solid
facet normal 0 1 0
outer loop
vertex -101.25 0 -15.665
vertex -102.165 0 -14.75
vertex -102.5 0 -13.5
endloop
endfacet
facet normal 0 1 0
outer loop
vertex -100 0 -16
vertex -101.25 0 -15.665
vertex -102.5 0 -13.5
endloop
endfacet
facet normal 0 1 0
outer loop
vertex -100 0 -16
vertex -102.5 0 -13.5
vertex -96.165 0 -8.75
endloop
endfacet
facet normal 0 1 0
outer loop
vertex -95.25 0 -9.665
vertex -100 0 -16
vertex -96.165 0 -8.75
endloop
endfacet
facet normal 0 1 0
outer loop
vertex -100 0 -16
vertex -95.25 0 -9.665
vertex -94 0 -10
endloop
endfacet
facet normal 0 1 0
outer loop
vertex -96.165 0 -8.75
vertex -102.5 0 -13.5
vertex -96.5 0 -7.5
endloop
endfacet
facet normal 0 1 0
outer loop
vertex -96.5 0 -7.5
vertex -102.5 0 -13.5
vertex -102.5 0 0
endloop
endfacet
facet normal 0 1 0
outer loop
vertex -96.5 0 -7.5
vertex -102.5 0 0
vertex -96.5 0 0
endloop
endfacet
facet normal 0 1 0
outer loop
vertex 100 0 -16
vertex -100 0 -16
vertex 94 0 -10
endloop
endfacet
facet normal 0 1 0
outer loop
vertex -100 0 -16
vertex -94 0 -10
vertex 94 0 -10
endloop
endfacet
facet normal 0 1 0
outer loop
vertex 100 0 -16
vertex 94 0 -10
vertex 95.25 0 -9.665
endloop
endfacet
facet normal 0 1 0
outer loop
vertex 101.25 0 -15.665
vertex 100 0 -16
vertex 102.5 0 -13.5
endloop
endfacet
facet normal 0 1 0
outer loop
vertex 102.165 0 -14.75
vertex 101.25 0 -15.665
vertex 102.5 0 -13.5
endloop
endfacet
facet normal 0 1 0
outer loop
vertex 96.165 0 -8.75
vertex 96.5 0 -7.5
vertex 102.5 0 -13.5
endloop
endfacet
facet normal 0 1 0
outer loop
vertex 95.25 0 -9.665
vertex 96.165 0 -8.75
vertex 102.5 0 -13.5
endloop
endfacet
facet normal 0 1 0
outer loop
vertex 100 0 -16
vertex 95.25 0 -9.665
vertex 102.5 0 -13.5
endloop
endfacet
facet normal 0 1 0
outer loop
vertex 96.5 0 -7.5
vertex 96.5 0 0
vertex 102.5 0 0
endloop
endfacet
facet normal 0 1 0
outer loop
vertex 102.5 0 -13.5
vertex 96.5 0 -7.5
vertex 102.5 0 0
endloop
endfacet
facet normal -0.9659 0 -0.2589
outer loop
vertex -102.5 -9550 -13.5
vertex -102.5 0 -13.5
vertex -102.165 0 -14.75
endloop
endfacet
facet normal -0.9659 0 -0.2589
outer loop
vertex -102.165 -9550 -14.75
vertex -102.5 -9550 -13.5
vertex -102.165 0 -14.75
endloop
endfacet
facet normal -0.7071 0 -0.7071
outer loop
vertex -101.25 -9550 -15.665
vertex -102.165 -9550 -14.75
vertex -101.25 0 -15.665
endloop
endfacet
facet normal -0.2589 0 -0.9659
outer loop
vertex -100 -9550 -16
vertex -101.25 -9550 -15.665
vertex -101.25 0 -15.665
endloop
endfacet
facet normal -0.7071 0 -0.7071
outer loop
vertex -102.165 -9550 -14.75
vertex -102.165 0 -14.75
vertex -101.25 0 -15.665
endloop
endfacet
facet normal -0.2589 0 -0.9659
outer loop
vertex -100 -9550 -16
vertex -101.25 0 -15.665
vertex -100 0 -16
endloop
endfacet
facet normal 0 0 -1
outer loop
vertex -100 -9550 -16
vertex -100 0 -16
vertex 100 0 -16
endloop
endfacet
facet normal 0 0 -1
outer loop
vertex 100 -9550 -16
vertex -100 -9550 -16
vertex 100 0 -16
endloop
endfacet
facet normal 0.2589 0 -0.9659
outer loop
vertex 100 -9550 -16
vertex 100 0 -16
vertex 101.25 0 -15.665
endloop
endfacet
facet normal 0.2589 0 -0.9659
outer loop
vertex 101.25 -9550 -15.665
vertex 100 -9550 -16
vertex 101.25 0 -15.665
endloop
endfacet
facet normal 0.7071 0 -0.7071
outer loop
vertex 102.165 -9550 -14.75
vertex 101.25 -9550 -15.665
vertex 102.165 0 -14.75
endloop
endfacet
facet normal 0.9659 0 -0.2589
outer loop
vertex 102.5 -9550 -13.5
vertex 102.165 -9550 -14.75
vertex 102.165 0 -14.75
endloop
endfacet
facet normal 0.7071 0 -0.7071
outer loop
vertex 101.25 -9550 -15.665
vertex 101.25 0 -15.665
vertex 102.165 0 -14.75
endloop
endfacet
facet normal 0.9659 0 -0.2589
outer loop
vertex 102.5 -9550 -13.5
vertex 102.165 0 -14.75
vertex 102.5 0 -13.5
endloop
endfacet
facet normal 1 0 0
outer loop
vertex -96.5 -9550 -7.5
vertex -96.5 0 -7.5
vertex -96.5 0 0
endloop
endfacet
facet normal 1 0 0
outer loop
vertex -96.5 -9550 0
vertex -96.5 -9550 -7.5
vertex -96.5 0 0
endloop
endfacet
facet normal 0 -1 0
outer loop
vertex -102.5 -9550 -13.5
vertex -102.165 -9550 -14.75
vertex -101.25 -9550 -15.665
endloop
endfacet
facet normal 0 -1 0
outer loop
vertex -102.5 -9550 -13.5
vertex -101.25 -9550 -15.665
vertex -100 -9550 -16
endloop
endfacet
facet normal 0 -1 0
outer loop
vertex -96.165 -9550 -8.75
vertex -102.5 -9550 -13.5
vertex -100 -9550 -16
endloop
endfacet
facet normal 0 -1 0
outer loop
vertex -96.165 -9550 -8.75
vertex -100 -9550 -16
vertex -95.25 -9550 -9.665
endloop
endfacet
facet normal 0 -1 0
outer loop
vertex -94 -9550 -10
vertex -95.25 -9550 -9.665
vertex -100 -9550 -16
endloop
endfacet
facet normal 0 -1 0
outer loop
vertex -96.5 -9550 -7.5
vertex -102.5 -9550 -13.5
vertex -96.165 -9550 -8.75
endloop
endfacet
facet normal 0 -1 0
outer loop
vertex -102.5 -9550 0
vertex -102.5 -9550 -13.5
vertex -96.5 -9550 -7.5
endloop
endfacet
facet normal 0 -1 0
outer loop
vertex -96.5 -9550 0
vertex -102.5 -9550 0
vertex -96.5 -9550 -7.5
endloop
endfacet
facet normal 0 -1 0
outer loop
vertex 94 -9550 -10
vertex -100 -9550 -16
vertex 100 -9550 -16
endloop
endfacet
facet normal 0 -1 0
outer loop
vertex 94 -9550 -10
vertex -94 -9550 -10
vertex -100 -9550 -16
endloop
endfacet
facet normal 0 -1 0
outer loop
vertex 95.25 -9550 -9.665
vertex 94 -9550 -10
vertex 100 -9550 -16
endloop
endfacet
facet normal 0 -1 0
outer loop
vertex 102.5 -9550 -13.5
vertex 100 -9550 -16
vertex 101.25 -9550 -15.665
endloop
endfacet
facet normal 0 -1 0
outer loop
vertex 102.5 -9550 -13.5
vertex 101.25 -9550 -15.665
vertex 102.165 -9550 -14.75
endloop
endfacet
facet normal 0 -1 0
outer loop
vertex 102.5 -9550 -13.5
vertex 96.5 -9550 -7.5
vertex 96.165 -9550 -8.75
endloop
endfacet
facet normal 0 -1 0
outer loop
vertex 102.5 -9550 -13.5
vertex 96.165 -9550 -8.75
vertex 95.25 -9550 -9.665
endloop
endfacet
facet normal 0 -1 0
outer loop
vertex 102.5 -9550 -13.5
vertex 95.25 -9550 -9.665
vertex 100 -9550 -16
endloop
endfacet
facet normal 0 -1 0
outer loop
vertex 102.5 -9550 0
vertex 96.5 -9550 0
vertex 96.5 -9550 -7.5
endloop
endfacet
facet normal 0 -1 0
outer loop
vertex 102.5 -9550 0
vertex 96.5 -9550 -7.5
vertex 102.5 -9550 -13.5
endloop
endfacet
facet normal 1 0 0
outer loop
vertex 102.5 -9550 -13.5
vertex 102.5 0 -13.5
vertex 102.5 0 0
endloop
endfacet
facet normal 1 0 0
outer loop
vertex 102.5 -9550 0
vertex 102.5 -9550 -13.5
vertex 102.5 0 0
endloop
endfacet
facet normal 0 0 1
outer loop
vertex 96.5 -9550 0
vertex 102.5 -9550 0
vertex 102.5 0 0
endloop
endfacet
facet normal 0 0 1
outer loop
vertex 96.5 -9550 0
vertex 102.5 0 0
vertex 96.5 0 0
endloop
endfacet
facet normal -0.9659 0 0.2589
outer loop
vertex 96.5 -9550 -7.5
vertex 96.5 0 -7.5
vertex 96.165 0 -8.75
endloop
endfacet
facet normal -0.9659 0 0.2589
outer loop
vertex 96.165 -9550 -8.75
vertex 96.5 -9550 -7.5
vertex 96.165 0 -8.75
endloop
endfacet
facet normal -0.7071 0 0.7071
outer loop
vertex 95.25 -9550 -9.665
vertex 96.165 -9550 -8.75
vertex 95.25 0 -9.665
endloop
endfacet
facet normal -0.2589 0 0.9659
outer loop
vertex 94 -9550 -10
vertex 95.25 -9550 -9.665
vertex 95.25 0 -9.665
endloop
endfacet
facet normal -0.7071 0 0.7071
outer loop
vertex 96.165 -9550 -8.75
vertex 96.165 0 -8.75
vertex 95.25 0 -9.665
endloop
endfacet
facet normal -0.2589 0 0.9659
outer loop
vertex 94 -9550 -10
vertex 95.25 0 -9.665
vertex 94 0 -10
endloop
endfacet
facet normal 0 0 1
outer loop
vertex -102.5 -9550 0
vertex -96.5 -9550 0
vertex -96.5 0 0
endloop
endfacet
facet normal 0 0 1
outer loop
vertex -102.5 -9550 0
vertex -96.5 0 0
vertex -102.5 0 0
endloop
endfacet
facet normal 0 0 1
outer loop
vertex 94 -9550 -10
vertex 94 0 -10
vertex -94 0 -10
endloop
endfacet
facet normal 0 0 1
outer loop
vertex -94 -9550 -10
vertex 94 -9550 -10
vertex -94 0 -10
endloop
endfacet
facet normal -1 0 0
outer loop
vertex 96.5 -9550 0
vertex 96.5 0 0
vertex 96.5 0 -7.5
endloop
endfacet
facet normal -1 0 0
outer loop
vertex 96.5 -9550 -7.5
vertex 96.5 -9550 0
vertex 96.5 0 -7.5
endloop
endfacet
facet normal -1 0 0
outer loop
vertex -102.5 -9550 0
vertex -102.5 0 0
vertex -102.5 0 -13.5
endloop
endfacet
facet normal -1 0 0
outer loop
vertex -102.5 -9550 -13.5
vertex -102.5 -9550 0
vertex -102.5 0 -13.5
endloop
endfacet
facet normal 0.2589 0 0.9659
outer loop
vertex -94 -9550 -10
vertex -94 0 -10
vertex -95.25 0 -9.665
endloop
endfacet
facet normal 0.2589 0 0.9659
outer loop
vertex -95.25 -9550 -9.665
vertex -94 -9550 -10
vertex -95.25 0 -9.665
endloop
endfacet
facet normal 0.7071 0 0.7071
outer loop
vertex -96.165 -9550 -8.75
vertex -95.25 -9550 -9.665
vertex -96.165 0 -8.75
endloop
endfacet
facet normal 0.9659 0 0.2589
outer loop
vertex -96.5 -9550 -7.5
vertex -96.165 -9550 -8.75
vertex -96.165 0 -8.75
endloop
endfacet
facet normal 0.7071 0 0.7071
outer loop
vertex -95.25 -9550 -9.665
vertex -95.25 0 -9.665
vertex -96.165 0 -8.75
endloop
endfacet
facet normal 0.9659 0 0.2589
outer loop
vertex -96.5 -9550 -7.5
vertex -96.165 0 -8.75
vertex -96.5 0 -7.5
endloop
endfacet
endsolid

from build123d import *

# Parameters (mm, degrees)
F1_DEPTH = 9550


with BuildPart() as f1:
    # F0 (on Front) → F1 (new body)
    with BuildSketch(Plane.XZ):
        with BuildLine():
            Line((-100, -16), (100, -16))
            ThreePointArc((100, -16), (101.767767, -15.267767), (102.5, -13.5))
            Line((102.5, -13.5), (102.5, 0))
            Line((102.5, 0), (99.5, 0))
            Line((99.5, 0), (99.5, -10.5))
            ThreePointArc((99.5, -10.5), (98.767767, -12.267767), (97, -13))
            Line((97, -13), (-97, -13))
            ThreePointArc((-97, -13), (-98.767767, -12.267767), (-99.5, -10.5))
            Line((-99.5, -10.5), (-99.5, 0))
            Line((-99.5, 0), (-102.5, 0))
            Line((-102.5, 0), (-102.5, -13.5))
            ThreePointArc((-102.5, -13.5), (-101.767767, -15.267767), (-100, -16))
        make_face()
        with BuildLine():
            Line((99.5, -10.5), (99.5, 0))
            Line((99.5, 0), (96.5, 0))
            Line((96.5, 0), (96.5, -7.5))
            ThreePointArc((96.5, -7.5), (95.767767, -9.267767), (94, -10))
            Line((94, -10), (-94, -10))
            ThreePointArc((-94, -10), (-95.767767, -9.267767), (-96.5, -7.5))
            Line((-96.5, -7.5), (-96.5, 0))
            Line((-96.5, 0), (-99.5, 0))
            Line((-99.5, 0), (-99.5, -10.5))
            ThreePointArc((-99.5, -10.5), (-98.767767, -12.267767), (-97, -13))
            Line((-97, -13), (97, -13))
            ThreePointArc((97, -13), (98.767767, -12.267767), (99.5, -10.5))
        make_face()
    extrude(amount=F1_DEPTH)


solid = f1.part
